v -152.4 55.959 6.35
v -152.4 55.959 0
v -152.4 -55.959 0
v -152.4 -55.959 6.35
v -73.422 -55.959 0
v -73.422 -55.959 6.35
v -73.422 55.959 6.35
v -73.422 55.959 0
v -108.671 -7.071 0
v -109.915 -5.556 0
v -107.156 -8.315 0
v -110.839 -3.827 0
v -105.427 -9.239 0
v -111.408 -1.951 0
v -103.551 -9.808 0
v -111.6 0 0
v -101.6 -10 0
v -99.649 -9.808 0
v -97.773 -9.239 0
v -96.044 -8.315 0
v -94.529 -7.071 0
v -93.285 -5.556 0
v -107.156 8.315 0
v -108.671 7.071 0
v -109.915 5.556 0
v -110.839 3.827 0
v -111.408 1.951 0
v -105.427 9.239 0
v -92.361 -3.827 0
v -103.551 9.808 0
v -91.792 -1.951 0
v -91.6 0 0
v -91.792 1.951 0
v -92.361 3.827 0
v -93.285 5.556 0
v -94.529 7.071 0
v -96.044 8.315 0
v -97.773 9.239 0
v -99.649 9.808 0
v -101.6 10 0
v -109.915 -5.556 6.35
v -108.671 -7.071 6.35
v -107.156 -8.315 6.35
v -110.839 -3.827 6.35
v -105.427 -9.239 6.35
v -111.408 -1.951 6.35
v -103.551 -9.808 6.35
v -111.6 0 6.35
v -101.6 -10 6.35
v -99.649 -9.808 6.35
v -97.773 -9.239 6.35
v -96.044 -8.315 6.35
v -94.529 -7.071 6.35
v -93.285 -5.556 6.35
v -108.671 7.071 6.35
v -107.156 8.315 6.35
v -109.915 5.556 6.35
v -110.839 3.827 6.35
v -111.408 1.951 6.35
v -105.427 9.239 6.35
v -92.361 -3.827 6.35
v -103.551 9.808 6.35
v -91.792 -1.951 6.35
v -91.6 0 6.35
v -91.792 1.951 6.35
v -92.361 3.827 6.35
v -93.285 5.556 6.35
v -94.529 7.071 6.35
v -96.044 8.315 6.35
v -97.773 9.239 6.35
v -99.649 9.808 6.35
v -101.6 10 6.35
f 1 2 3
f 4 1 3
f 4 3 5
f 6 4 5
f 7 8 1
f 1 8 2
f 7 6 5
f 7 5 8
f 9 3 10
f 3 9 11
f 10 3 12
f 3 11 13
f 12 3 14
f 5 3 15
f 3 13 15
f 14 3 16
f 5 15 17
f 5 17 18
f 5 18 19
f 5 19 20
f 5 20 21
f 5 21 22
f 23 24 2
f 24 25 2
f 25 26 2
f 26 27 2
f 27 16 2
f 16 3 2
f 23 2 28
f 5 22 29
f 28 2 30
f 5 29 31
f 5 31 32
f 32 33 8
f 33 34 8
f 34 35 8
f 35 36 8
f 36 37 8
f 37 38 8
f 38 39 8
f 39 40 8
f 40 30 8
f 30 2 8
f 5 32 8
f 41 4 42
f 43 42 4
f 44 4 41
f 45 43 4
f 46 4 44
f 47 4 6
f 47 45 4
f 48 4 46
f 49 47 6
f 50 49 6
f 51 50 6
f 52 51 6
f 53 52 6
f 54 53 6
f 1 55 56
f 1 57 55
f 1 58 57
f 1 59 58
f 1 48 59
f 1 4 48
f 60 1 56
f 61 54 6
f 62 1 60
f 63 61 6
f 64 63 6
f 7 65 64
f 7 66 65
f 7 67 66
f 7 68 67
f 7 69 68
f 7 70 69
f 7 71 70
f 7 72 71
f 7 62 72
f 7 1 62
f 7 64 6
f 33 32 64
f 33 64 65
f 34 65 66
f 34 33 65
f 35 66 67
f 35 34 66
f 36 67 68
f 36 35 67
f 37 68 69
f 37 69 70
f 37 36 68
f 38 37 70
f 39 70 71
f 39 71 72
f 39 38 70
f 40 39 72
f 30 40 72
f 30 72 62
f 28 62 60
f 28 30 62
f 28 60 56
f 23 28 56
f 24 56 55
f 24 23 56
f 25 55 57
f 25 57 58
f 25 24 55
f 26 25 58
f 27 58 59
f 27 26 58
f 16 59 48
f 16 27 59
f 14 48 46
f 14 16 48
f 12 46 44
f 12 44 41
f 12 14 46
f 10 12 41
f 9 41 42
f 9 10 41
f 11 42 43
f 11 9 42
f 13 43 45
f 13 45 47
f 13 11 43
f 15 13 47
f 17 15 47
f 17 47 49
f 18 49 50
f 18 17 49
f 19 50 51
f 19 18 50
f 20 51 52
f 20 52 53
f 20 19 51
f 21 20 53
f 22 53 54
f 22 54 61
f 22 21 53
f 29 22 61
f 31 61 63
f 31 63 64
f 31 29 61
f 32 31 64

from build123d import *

# Parameters (mm, degrees)
F0_R     = 10
F1_DEPTH = 6.35
F2_W     = 124.221875
F2_H     = 111.91875
F2_R     = 10
F3_DEPTH = 6.351


# Not quite as in the source:
# - a feature names something its author has since deleted; it is built from what else it names


with BuildPart() as f1:
    # F0 (on Top) → F1 (new body)
    with BuildSketch(Plane.XY):
        Polygon((50.8, -55.959375), (50.8, 55.959375), (-50.8, 55.959375), (-152.4, 55.959375), (-152.4, -55.959375), (-50.8, -55.959375), align=None)
        with Locations((-101.6, 0)):
            Circle(F0_R, mode=Mode.SUBTRACT)
        Circle(F0_R, mode=Mode.SUBTRACT)
    extrude(amount=F1_DEPTH)

    # F2 (on face) → F3 (cut, through all)
    with BuildSketch(Plane.XY.offset(6.35)):
        with Locations((-11.3109375, 0)):
            Rectangle(F2_W, F2_H)
        Circle(F2_R, mode=Mode.SUBTRACT)
    extrude(amount=-F3_DEPTH, mode=Mode.SUBTRACT)


solid = f1.part
